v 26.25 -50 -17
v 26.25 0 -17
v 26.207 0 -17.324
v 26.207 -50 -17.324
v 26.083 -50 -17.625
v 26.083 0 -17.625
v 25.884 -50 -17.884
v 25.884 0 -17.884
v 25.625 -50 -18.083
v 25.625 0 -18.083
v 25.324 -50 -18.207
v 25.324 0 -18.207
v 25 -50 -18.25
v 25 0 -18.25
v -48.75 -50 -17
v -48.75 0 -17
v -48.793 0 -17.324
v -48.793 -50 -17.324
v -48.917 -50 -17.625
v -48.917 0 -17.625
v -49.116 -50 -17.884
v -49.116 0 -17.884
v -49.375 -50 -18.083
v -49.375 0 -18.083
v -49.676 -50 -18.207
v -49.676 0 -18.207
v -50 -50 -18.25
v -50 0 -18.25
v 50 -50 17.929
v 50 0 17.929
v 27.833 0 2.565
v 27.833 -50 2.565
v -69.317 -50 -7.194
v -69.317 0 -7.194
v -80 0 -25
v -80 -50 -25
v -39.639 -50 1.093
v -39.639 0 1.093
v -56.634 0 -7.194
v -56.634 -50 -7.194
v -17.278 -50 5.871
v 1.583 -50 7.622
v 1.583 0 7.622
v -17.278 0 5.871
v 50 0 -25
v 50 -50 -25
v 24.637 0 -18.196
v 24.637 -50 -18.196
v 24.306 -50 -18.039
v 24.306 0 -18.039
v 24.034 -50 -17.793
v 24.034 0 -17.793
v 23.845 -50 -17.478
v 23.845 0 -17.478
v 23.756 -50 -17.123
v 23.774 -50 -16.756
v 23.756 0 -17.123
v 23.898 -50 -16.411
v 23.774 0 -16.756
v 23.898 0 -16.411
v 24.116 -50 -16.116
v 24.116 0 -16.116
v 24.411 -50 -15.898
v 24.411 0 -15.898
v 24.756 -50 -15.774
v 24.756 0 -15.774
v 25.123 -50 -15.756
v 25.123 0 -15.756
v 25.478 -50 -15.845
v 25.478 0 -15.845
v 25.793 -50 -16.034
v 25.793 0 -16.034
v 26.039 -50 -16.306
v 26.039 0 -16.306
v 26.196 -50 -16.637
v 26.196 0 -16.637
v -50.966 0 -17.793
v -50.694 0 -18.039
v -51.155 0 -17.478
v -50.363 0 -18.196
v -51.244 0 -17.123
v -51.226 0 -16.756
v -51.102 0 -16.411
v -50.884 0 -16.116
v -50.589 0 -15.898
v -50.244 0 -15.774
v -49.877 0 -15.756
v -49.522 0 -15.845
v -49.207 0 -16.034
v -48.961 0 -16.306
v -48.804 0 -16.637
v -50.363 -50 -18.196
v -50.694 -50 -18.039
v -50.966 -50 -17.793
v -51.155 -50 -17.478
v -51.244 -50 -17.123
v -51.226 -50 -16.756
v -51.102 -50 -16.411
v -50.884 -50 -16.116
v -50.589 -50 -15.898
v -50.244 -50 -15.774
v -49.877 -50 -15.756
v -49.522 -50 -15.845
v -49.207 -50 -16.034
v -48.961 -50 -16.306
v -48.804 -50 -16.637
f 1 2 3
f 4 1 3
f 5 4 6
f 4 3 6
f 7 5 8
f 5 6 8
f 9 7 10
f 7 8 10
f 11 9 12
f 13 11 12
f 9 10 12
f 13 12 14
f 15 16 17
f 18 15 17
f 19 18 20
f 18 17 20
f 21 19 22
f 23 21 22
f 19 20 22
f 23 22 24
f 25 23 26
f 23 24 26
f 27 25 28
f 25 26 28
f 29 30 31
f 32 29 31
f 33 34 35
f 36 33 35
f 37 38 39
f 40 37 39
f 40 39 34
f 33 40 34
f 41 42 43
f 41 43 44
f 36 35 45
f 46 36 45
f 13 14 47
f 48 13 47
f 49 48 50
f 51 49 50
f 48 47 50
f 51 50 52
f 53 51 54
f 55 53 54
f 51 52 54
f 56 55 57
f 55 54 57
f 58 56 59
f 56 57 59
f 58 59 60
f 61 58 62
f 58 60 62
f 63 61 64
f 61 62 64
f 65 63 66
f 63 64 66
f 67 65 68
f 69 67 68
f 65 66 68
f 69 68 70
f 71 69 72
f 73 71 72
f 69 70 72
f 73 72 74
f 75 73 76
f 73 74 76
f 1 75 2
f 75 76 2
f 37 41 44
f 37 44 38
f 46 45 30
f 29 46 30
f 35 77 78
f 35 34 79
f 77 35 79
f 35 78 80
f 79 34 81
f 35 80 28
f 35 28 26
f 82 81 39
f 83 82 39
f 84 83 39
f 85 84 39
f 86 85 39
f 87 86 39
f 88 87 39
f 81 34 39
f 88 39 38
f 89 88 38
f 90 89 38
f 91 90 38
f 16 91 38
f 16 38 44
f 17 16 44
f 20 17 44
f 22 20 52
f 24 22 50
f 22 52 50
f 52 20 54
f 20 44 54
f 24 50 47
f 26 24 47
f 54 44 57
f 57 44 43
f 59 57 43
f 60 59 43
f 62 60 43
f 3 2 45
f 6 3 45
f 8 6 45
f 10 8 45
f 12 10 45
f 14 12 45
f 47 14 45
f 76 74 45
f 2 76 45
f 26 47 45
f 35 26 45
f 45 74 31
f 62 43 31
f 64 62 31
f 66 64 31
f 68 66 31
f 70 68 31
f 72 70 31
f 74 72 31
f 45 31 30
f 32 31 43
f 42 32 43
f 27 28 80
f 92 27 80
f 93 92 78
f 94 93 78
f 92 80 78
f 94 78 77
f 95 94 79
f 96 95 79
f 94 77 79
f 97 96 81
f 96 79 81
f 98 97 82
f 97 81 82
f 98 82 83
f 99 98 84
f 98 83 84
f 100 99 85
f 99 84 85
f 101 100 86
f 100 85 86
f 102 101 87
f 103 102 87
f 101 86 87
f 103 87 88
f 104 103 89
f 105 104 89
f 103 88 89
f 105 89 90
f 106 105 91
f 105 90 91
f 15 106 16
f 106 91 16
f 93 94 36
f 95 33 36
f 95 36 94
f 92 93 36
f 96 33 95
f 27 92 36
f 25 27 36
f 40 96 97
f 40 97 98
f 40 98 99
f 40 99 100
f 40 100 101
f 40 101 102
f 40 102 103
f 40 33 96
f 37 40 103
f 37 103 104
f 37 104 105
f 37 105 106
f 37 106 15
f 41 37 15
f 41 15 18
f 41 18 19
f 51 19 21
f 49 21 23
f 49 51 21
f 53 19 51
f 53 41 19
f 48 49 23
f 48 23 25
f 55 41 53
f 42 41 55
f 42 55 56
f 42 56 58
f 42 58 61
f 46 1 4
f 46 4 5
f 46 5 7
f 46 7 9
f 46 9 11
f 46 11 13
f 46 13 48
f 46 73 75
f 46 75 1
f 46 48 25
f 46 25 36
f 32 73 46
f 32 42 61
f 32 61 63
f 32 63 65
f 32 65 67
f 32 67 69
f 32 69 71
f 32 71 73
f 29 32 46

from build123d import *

# Parameters (mm, degrees)
F1_DEPTH = 50


with BuildPart() as f1:
    # F0 (on Front) → F1 (new body)
    with BuildSketch(Plane.XZ):
        Polygon((25, -25), (50, -25), (50, 17.929452), (27.833339, 2.565201), (1.583336, 7.62179), (-17.277775, 5.871432), (-39.638888, 1.093402), (-56.633994, -7.194445), (-69.316667, -7.194445), (-80, -25), (-50, -25), align=None)
        with BuildLine():
            ThreePointArc((-50, -18.25), (-50.883883, -16.116117), (-48.75, -17))
            ThreePointArc((-48.75, -17), (-49.116117, -17.883883), (-50, -18.25))
        make_face(mode=Mode.SUBTRACT)
        with BuildLine():
            ThreePointArc((25, -18.25), (24.116117, -16.116117), (26.25, -17))
            ThreePointArc((26.25, -17), (25.883883, -17.883883), (25, -18.25))
        make_face(mode=Mode.SUBTRACT)
    extrude(amount=F1_DEPTH)


solid = f1.part
